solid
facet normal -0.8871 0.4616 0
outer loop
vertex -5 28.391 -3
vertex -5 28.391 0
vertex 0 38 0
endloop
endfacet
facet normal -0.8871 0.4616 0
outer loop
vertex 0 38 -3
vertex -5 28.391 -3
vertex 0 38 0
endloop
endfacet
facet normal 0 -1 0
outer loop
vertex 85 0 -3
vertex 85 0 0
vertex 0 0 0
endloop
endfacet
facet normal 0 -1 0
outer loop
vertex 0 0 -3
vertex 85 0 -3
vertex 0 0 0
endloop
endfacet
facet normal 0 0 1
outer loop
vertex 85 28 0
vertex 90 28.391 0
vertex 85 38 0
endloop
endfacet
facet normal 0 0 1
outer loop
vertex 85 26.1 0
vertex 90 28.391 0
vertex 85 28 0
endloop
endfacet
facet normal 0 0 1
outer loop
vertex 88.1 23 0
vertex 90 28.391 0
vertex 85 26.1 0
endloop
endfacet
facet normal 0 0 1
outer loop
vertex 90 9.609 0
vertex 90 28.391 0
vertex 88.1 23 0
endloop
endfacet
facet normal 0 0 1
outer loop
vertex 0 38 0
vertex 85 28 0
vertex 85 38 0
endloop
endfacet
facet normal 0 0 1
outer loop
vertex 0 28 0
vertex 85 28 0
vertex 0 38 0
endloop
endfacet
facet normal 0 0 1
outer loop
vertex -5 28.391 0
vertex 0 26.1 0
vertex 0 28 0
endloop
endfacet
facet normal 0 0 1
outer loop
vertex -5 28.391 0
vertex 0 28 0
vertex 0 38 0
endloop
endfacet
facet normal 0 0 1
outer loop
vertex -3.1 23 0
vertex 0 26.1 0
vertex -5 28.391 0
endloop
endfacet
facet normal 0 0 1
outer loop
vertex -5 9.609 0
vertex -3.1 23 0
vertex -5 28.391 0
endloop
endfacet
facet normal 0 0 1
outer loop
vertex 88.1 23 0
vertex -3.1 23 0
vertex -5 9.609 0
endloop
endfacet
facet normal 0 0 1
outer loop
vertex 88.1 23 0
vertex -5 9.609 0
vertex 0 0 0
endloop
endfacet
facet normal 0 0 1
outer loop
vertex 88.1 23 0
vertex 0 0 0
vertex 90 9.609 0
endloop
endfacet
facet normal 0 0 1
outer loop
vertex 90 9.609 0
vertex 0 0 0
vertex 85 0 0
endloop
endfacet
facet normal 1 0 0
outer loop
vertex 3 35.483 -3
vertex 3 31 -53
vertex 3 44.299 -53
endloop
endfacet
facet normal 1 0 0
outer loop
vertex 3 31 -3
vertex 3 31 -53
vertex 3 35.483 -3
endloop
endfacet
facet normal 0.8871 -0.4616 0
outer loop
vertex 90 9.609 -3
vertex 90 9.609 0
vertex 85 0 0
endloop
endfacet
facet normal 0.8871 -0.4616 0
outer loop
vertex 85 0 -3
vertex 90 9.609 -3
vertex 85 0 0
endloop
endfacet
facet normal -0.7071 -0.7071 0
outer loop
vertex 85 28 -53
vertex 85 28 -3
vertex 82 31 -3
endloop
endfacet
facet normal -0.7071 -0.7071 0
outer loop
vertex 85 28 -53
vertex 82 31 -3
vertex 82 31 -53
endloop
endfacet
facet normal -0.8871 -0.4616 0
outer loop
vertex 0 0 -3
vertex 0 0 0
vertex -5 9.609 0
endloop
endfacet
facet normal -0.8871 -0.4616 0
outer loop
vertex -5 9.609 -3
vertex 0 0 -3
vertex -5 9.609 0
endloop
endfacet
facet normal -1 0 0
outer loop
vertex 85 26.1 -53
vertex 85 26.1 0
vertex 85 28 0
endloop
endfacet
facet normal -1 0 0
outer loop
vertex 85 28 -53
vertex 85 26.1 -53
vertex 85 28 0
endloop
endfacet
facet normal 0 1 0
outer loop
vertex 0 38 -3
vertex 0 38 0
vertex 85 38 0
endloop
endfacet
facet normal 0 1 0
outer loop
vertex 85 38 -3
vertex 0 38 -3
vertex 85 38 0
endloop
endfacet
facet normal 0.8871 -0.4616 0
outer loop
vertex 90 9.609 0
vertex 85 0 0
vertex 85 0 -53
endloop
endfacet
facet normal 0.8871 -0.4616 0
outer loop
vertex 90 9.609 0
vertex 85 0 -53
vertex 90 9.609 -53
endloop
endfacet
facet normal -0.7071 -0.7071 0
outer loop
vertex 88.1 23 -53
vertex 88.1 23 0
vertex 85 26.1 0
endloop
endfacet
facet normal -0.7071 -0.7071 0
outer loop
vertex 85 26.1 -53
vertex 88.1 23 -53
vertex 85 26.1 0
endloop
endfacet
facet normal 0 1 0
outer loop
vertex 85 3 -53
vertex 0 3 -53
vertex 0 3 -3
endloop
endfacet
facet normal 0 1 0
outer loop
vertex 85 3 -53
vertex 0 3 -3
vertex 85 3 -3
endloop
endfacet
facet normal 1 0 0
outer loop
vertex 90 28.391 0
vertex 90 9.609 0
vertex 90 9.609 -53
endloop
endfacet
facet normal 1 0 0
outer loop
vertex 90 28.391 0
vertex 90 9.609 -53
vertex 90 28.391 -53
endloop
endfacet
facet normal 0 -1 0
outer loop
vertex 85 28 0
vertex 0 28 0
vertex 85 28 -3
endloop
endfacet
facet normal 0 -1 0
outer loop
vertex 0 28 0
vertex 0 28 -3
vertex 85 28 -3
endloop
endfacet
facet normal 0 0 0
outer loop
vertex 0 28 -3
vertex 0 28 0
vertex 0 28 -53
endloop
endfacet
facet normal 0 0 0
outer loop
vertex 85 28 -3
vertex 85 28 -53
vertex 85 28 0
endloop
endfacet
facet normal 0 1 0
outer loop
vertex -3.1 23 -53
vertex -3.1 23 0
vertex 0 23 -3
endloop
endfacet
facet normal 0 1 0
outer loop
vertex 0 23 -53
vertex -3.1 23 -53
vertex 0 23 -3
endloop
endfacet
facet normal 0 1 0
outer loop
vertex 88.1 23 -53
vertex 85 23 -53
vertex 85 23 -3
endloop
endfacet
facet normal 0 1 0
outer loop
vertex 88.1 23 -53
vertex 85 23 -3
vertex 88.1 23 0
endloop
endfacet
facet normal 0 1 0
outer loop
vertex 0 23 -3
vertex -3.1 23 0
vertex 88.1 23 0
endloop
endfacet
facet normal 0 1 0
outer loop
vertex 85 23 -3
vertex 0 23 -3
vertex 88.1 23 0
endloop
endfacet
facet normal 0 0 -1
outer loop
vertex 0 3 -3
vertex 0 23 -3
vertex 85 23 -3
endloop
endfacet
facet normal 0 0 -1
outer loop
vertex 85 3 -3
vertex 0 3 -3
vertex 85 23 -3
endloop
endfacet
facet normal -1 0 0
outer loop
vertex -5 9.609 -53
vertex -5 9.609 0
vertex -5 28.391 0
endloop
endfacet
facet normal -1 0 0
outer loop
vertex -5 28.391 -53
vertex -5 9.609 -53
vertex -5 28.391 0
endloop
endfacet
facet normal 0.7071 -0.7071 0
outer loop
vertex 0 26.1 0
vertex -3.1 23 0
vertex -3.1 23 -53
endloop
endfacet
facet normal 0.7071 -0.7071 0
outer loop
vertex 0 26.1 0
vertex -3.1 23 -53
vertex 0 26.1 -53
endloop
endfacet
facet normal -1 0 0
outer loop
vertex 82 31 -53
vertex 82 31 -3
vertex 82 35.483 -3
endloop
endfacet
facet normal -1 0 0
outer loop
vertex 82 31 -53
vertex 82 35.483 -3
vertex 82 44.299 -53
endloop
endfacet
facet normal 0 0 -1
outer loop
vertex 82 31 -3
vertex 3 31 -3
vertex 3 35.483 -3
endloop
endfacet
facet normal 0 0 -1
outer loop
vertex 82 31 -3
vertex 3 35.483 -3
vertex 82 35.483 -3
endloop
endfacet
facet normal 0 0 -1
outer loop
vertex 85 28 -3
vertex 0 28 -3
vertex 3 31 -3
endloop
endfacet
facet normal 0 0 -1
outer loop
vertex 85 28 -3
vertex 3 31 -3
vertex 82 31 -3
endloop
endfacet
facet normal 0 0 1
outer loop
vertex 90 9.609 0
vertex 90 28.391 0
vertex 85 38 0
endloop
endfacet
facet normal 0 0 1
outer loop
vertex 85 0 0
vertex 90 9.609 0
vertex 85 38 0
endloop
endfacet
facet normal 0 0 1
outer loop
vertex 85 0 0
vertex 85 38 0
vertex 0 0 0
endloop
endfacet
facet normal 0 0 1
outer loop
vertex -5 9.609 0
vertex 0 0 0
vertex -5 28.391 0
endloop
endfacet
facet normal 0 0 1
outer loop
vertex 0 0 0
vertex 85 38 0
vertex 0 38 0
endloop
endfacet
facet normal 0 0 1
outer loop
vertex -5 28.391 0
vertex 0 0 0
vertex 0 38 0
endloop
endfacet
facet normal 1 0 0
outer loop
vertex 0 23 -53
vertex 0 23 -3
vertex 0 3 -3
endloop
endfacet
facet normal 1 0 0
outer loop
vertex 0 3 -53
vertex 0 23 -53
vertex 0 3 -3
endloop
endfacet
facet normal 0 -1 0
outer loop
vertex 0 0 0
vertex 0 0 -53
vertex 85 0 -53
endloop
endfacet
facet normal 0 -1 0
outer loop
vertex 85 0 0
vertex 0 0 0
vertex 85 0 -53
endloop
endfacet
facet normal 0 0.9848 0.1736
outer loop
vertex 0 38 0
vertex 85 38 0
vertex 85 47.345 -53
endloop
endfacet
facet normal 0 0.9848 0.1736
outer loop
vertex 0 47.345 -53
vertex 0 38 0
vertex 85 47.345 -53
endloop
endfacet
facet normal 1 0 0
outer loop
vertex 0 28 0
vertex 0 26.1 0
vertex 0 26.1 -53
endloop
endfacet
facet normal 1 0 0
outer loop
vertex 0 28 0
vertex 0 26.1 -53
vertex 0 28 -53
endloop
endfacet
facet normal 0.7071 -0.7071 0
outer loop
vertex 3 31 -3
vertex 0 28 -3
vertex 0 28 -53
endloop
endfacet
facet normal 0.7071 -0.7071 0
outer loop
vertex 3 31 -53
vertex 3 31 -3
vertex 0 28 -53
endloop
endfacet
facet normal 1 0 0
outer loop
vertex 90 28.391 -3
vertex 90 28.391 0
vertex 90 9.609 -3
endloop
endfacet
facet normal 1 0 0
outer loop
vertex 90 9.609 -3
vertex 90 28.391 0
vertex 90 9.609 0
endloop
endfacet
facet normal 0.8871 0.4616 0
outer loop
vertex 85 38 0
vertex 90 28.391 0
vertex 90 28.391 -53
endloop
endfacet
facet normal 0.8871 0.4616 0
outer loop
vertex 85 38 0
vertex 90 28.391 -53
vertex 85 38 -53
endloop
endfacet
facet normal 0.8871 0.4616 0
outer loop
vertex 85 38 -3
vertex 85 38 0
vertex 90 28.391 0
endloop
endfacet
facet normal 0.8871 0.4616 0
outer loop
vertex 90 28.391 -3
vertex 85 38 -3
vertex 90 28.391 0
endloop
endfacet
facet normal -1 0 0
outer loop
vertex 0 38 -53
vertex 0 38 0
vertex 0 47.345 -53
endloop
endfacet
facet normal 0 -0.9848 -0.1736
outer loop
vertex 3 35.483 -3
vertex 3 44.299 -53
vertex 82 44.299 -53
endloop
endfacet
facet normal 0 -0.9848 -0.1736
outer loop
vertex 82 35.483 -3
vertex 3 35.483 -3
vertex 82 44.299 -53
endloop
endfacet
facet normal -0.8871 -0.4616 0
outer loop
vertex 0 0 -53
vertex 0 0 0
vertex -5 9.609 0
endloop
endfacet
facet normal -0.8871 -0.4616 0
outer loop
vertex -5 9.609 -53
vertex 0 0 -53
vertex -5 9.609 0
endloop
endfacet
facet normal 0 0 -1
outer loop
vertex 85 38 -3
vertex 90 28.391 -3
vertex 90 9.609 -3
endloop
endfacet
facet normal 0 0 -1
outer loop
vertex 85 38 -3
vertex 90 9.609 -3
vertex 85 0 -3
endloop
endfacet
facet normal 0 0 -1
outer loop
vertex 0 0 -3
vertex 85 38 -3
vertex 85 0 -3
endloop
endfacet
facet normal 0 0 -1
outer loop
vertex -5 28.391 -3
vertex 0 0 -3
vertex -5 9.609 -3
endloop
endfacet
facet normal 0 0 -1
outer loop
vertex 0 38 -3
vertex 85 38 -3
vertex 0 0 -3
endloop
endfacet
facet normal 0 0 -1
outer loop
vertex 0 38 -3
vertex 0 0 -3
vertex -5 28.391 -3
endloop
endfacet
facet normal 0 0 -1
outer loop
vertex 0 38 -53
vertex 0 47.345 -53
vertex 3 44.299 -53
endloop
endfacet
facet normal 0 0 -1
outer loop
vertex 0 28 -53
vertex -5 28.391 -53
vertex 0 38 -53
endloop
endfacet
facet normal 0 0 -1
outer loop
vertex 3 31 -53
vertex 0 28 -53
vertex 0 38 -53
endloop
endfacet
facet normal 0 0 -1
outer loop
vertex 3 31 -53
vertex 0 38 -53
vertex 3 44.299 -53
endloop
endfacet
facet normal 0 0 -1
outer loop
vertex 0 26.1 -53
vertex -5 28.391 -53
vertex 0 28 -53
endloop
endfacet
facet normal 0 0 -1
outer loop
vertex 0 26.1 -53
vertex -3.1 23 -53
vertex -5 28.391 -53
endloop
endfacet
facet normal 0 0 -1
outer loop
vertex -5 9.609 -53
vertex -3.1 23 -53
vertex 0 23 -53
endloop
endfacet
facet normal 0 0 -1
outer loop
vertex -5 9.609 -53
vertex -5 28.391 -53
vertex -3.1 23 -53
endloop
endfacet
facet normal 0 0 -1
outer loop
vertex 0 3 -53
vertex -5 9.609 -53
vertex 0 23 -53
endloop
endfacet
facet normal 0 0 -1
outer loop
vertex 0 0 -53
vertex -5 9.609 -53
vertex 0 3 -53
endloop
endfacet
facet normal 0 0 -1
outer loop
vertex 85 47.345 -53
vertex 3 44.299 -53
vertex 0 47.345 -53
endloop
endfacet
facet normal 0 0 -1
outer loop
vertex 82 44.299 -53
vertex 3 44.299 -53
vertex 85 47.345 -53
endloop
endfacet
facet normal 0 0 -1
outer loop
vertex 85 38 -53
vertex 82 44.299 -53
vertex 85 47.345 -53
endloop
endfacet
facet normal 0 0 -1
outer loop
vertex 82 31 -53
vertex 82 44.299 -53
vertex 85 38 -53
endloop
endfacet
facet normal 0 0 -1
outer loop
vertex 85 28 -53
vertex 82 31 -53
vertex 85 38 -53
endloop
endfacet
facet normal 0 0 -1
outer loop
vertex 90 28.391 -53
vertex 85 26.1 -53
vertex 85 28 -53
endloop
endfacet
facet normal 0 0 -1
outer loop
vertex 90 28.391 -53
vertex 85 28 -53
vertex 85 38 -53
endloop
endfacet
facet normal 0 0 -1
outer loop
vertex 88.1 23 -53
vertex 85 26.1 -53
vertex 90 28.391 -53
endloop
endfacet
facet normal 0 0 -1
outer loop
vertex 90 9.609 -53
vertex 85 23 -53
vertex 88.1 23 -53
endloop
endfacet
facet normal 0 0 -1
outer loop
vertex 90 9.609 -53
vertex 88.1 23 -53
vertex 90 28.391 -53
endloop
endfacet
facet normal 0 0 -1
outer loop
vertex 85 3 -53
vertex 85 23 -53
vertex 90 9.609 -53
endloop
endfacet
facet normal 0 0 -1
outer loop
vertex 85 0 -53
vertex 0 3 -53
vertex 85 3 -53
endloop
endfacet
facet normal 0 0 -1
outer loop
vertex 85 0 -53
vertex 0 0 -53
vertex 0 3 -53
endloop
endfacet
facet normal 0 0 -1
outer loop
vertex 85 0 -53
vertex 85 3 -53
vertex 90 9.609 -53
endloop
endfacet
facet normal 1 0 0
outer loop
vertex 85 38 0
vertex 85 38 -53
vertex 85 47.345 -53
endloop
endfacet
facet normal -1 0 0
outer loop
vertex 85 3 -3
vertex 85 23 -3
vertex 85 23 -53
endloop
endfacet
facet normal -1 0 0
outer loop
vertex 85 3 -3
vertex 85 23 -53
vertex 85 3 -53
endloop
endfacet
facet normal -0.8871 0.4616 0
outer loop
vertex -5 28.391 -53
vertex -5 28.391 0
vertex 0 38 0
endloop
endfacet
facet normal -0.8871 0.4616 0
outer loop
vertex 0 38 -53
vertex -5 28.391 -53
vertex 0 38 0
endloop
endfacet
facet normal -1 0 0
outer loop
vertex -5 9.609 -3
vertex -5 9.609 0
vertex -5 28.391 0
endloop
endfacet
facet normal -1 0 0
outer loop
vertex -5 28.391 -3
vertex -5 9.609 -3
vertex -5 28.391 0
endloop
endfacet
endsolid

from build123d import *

# Parameters (mm, degrees)
SKETCH1_W                      = 85
SKETCH1_H                      = 93
BOSS_EXTRUDE1_BASE_DEPTH       = 3
BOSS_EXTRUDE4_SIDE_WALLS_DEPTH = 93
CUT_EXTRUDE2_START             = 3
CUT_EXTRUDE2_GUIDE_HOLES_DEPTH = 138.881429411
SKETCH15_W                     = 85
SKETCH15_H                     = 20
BOSS_EXTRUDE9_REAR_WALL_DEPTH  = 3
BOSS_EXTRUDE1_START            = 3
SKETCH17_W                     = 85
SKETCH17_H                     = 3
BOSS_EXTRUDE1_REAR_WALL_DEPTH  = 12
SKETCH30_W                     = 85
SKETCH30_H                     = 2
CUT_EXTRUDE1_REAR_WALL_DEPTH   = 10
BOSS_EXTRUDE2_START            = 25
SKETCH20_W                     = 3
SKETCH20_H                     = 90
BOSS_EXTRUDE2_SIDE_WALL_DEPTH  = 10
CHAMFER1_SIDE_WALL_SIZE        = 3
BOSS_EXTRUDE5_SIDE_WALL_DEPTH  = 30
CHAMFER2_ROOF_SIZE             = 30
CHAMFER2_ROOF_SIZE_2           = 170.138454589
SKETCH28_W                     = 85
SKETCH28_H                     = 94.434674906
BOSS_EXTRUDE7_ROOF_DEPTH       = 3
SKETCH29_W                     = 5.082998623
SKETCH29_H                     = 55.59785115
CUT_EXTRUDE1_CLEAN_UP_DEPTH    = 144.980394466
SKETCH31_W                     = 95
SKETCH31_H                     = 40
CUT_EXTRUDE2_CLEAN_UP_DEPTH    = 141.385850156
BOSS_EXTRUDE1_DEPTH            = 3


# Some blends are built 0.0001 mm under size
with BuildPart() as part:
    # Sketch1 → Boss-Extrude1 _Base (new body)
    with BuildSketch(Plane(origin=(0, 0, 0), x_dir=(1, 0, 0), z_dir=(0, 1, 0))):
        with Locations((42.5, 46.5)):
            Rectangle(SKETCH1_W, SKETCH1_H)
    extrude(amount=BOSS_EXTRUDE1_BASE_DEPTH)

    # Sketch5 → Boss-Extrude4 _Side Walls (add, through all)
    with BuildSketch(Plane.XY):
        Polygon((-5, 28.390936655), (0, 38), (0, 0), (-5, 9.609063345), align=None)
        Polygon((90, 9.609063345), (90, 28.390936655), (85, 38), (85, 0), align=None)
    extrude(amount=-BOSS_EXTRUDE4_SIDE_WALLS_DEPTH)

    # Sketch4 → Cut-Extrude2 _Guide Holes (cut, through all)
    with BuildSketch(Plane.XY.offset(CUT_EXTRUDE2_START)):
        Polygon((-3.1, 23), (0, 26.1), (0, 23), align=None)
        Polygon((85, 23), (88.1, 23), (85, 26.1), align=None)
    extrude(amount=-CUT_EXTRUDE2_GUIDE_HOLES_DEPTH, mode=Mode.SUBTRACT)

    # Sketch15 → Boss-Extrude9 _Rear Wall (add)
    with BuildSketch(Plane.XY):
        with Locations((42.5, 13)):
            Rectangle(SKETCH15_W, SKETCH15_H)
    extrude(amount=-BOSS_EXTRUDE9_REAR_WALL_DEPTH)

    # Sketch17 → Boss-Extrude1 _Rear Wall (add)
    with BuildSketch(Plane(origin=(0, 23, 0), x_dir=(1, 0, 0), z_dir=(0, 1, 0)).offset(BOSS_EXTRUDE1_START)):
        with Locations((42.5, 1.5)):
            Rectangle(SKETCH17_W, SKETCH17_H)
    extrude(amount=BOSS_EXTRUDE1_REAR_WALL_DEPTH)

    # Sketch30 → Cut-Extrude1 _Rear Wall (cut)
    with BuildSketch(Plane.XY):
        with Locations((42.5, 27)):
            Rectangle(SKETCH30_W, SKETCH30_H)
    extrude(amount=-CUT_EXTRUDE1_REAR_WALL_DEPTH, mode=Mode.SUBTRACT)

    # Sketch20 → Boss-Extrude2 _Side Wall (add)
    with BuildSketch(Plane(origin=(0, 3, 0), x_dir=(1, 0, 0), z_dir=(0, 1, 0)).offset(BOSS_EXTRUDE2_START)):
        with Locations((1.5, 48)):
            Rectangle(SKETCH20_W, SKETCH20_H)
        with Locations((83.5, 48)):
            Rectangle(SKETCH20_W, SKETCH20_H)
    extrude(amount=BOSS_EXTRUDE2_SIDE_WALL_DEPTH)

    # Chamfer1 _Side Wall
    chamfer1_side_wall_edges = [part.edges().sort_by_distance(p)[0] for p in [
        (82, 28, -48),
        (3, 28, -48),
    ]]
    chamfer(chamfer1_side_wall_edges, length=CHAMFER1_SIDE_WALL_SIZE - 0.0001)  # a hair under: the kernel refuses the full size

    # Sketch26 → Boss-Extrude5 _Side Wall (add)
    with BuildSketch(Plane(origin=(0, 38, 0), x_dir=(1, 0, 0), z_dir=(0, 1, 0))):
        Polygon((0, 0), (0, 93), (3, 93), (3, 3), (82, 3), (82, 93), (85, 93), (85, 0), align=None)
    extrude(amount=BOSS_EXTRUDE5_SIDE_WALL_DEPTH)

    # Chamfer2 _Roof
    # the kernel refuses this chamfer: 170.138454589, 30 mm, written as the material it takes off along each edge
    with BuildSketch(Plane(origin=(527.111375011, 68, 0), x_dir=(0, -0.9776715712462578, 0.21013876076743532), z_dir=(-1, 0, 0))) as chamfer2_roof_piece_1:
        Polygon((CHAMFER2_ROOF_SIZE * 0.977671571246, -CHAMFER2_ROOF_SIZE * 0.210138760767), (-CHAMFER2_ROOF_SIZE_2 * 0.210138760767, -CHAMFER2_ROOF_SIZE_2 * 0.977671571244), (0, 0), align=None)
    extrude(amount=969.222750023, mode=Mode.SUBTRACT)

    # Sketch28 → Boss-Extrude7 _Roof (add)
    with BuildSketch(Plane(origin=(0, 36.854159795, 6.498382723), x_dir=(1, 0, 0), z_dir=(0, 0.9848077530122086, 0.17364817766692742))):
        with Locations((42.5, 53.815968204)):
            Rectangle(SKETCH28_W, SKETCH28_H)
    extrude(amount=-BOSS_EXTRUDE7_ROOF_DEPTH)

    # Sketch29 → Cut-Extrude1 _Clean up (cut, through all)
    with BuildSketch(Plane(origin=(90, 0, 0), x_dir=(0, 0, -1), z_dir=(1, 0, 0))):
        with Locations((95.541499312, 27.798925575)):
            Rectangle(SKETCH29_W, SKETCH29_H)
    extrude(amount=-CUT_EXTRUDE1_CLEAN_UP_DEPTH, mode=Mode.SUBTRACT)

    # Sketch31 → Cut-Extrude2 _Clean Up (cut, through all)
    with BuildSketch(Plane.XZ):
        with Locations((42.5, -73)):
            Rectangle(SKETCH31_W, SKETCH31_H)
    extrude(amount=-CUT_EXTRUDE2_CLEAN_UP_DEPTH, mode=Mode.SUBTRACT)


with BuildPart() as body_2:
    # Sketch33 → Boss-Extrude1 (new body)
    with BuildSketch(Plane.XY):
        Polygon((-5, 28.390936655), (0, 38), (85, 38), (90, 28.390936655), (90, 9.609063345), (85, 0), (0, 0), (-5, 9.609063345), align=None)
    extrude(amount=-BOSS_EXTRUDE1_DEPTH)


solid = Compound([part.part, body_2.part])
